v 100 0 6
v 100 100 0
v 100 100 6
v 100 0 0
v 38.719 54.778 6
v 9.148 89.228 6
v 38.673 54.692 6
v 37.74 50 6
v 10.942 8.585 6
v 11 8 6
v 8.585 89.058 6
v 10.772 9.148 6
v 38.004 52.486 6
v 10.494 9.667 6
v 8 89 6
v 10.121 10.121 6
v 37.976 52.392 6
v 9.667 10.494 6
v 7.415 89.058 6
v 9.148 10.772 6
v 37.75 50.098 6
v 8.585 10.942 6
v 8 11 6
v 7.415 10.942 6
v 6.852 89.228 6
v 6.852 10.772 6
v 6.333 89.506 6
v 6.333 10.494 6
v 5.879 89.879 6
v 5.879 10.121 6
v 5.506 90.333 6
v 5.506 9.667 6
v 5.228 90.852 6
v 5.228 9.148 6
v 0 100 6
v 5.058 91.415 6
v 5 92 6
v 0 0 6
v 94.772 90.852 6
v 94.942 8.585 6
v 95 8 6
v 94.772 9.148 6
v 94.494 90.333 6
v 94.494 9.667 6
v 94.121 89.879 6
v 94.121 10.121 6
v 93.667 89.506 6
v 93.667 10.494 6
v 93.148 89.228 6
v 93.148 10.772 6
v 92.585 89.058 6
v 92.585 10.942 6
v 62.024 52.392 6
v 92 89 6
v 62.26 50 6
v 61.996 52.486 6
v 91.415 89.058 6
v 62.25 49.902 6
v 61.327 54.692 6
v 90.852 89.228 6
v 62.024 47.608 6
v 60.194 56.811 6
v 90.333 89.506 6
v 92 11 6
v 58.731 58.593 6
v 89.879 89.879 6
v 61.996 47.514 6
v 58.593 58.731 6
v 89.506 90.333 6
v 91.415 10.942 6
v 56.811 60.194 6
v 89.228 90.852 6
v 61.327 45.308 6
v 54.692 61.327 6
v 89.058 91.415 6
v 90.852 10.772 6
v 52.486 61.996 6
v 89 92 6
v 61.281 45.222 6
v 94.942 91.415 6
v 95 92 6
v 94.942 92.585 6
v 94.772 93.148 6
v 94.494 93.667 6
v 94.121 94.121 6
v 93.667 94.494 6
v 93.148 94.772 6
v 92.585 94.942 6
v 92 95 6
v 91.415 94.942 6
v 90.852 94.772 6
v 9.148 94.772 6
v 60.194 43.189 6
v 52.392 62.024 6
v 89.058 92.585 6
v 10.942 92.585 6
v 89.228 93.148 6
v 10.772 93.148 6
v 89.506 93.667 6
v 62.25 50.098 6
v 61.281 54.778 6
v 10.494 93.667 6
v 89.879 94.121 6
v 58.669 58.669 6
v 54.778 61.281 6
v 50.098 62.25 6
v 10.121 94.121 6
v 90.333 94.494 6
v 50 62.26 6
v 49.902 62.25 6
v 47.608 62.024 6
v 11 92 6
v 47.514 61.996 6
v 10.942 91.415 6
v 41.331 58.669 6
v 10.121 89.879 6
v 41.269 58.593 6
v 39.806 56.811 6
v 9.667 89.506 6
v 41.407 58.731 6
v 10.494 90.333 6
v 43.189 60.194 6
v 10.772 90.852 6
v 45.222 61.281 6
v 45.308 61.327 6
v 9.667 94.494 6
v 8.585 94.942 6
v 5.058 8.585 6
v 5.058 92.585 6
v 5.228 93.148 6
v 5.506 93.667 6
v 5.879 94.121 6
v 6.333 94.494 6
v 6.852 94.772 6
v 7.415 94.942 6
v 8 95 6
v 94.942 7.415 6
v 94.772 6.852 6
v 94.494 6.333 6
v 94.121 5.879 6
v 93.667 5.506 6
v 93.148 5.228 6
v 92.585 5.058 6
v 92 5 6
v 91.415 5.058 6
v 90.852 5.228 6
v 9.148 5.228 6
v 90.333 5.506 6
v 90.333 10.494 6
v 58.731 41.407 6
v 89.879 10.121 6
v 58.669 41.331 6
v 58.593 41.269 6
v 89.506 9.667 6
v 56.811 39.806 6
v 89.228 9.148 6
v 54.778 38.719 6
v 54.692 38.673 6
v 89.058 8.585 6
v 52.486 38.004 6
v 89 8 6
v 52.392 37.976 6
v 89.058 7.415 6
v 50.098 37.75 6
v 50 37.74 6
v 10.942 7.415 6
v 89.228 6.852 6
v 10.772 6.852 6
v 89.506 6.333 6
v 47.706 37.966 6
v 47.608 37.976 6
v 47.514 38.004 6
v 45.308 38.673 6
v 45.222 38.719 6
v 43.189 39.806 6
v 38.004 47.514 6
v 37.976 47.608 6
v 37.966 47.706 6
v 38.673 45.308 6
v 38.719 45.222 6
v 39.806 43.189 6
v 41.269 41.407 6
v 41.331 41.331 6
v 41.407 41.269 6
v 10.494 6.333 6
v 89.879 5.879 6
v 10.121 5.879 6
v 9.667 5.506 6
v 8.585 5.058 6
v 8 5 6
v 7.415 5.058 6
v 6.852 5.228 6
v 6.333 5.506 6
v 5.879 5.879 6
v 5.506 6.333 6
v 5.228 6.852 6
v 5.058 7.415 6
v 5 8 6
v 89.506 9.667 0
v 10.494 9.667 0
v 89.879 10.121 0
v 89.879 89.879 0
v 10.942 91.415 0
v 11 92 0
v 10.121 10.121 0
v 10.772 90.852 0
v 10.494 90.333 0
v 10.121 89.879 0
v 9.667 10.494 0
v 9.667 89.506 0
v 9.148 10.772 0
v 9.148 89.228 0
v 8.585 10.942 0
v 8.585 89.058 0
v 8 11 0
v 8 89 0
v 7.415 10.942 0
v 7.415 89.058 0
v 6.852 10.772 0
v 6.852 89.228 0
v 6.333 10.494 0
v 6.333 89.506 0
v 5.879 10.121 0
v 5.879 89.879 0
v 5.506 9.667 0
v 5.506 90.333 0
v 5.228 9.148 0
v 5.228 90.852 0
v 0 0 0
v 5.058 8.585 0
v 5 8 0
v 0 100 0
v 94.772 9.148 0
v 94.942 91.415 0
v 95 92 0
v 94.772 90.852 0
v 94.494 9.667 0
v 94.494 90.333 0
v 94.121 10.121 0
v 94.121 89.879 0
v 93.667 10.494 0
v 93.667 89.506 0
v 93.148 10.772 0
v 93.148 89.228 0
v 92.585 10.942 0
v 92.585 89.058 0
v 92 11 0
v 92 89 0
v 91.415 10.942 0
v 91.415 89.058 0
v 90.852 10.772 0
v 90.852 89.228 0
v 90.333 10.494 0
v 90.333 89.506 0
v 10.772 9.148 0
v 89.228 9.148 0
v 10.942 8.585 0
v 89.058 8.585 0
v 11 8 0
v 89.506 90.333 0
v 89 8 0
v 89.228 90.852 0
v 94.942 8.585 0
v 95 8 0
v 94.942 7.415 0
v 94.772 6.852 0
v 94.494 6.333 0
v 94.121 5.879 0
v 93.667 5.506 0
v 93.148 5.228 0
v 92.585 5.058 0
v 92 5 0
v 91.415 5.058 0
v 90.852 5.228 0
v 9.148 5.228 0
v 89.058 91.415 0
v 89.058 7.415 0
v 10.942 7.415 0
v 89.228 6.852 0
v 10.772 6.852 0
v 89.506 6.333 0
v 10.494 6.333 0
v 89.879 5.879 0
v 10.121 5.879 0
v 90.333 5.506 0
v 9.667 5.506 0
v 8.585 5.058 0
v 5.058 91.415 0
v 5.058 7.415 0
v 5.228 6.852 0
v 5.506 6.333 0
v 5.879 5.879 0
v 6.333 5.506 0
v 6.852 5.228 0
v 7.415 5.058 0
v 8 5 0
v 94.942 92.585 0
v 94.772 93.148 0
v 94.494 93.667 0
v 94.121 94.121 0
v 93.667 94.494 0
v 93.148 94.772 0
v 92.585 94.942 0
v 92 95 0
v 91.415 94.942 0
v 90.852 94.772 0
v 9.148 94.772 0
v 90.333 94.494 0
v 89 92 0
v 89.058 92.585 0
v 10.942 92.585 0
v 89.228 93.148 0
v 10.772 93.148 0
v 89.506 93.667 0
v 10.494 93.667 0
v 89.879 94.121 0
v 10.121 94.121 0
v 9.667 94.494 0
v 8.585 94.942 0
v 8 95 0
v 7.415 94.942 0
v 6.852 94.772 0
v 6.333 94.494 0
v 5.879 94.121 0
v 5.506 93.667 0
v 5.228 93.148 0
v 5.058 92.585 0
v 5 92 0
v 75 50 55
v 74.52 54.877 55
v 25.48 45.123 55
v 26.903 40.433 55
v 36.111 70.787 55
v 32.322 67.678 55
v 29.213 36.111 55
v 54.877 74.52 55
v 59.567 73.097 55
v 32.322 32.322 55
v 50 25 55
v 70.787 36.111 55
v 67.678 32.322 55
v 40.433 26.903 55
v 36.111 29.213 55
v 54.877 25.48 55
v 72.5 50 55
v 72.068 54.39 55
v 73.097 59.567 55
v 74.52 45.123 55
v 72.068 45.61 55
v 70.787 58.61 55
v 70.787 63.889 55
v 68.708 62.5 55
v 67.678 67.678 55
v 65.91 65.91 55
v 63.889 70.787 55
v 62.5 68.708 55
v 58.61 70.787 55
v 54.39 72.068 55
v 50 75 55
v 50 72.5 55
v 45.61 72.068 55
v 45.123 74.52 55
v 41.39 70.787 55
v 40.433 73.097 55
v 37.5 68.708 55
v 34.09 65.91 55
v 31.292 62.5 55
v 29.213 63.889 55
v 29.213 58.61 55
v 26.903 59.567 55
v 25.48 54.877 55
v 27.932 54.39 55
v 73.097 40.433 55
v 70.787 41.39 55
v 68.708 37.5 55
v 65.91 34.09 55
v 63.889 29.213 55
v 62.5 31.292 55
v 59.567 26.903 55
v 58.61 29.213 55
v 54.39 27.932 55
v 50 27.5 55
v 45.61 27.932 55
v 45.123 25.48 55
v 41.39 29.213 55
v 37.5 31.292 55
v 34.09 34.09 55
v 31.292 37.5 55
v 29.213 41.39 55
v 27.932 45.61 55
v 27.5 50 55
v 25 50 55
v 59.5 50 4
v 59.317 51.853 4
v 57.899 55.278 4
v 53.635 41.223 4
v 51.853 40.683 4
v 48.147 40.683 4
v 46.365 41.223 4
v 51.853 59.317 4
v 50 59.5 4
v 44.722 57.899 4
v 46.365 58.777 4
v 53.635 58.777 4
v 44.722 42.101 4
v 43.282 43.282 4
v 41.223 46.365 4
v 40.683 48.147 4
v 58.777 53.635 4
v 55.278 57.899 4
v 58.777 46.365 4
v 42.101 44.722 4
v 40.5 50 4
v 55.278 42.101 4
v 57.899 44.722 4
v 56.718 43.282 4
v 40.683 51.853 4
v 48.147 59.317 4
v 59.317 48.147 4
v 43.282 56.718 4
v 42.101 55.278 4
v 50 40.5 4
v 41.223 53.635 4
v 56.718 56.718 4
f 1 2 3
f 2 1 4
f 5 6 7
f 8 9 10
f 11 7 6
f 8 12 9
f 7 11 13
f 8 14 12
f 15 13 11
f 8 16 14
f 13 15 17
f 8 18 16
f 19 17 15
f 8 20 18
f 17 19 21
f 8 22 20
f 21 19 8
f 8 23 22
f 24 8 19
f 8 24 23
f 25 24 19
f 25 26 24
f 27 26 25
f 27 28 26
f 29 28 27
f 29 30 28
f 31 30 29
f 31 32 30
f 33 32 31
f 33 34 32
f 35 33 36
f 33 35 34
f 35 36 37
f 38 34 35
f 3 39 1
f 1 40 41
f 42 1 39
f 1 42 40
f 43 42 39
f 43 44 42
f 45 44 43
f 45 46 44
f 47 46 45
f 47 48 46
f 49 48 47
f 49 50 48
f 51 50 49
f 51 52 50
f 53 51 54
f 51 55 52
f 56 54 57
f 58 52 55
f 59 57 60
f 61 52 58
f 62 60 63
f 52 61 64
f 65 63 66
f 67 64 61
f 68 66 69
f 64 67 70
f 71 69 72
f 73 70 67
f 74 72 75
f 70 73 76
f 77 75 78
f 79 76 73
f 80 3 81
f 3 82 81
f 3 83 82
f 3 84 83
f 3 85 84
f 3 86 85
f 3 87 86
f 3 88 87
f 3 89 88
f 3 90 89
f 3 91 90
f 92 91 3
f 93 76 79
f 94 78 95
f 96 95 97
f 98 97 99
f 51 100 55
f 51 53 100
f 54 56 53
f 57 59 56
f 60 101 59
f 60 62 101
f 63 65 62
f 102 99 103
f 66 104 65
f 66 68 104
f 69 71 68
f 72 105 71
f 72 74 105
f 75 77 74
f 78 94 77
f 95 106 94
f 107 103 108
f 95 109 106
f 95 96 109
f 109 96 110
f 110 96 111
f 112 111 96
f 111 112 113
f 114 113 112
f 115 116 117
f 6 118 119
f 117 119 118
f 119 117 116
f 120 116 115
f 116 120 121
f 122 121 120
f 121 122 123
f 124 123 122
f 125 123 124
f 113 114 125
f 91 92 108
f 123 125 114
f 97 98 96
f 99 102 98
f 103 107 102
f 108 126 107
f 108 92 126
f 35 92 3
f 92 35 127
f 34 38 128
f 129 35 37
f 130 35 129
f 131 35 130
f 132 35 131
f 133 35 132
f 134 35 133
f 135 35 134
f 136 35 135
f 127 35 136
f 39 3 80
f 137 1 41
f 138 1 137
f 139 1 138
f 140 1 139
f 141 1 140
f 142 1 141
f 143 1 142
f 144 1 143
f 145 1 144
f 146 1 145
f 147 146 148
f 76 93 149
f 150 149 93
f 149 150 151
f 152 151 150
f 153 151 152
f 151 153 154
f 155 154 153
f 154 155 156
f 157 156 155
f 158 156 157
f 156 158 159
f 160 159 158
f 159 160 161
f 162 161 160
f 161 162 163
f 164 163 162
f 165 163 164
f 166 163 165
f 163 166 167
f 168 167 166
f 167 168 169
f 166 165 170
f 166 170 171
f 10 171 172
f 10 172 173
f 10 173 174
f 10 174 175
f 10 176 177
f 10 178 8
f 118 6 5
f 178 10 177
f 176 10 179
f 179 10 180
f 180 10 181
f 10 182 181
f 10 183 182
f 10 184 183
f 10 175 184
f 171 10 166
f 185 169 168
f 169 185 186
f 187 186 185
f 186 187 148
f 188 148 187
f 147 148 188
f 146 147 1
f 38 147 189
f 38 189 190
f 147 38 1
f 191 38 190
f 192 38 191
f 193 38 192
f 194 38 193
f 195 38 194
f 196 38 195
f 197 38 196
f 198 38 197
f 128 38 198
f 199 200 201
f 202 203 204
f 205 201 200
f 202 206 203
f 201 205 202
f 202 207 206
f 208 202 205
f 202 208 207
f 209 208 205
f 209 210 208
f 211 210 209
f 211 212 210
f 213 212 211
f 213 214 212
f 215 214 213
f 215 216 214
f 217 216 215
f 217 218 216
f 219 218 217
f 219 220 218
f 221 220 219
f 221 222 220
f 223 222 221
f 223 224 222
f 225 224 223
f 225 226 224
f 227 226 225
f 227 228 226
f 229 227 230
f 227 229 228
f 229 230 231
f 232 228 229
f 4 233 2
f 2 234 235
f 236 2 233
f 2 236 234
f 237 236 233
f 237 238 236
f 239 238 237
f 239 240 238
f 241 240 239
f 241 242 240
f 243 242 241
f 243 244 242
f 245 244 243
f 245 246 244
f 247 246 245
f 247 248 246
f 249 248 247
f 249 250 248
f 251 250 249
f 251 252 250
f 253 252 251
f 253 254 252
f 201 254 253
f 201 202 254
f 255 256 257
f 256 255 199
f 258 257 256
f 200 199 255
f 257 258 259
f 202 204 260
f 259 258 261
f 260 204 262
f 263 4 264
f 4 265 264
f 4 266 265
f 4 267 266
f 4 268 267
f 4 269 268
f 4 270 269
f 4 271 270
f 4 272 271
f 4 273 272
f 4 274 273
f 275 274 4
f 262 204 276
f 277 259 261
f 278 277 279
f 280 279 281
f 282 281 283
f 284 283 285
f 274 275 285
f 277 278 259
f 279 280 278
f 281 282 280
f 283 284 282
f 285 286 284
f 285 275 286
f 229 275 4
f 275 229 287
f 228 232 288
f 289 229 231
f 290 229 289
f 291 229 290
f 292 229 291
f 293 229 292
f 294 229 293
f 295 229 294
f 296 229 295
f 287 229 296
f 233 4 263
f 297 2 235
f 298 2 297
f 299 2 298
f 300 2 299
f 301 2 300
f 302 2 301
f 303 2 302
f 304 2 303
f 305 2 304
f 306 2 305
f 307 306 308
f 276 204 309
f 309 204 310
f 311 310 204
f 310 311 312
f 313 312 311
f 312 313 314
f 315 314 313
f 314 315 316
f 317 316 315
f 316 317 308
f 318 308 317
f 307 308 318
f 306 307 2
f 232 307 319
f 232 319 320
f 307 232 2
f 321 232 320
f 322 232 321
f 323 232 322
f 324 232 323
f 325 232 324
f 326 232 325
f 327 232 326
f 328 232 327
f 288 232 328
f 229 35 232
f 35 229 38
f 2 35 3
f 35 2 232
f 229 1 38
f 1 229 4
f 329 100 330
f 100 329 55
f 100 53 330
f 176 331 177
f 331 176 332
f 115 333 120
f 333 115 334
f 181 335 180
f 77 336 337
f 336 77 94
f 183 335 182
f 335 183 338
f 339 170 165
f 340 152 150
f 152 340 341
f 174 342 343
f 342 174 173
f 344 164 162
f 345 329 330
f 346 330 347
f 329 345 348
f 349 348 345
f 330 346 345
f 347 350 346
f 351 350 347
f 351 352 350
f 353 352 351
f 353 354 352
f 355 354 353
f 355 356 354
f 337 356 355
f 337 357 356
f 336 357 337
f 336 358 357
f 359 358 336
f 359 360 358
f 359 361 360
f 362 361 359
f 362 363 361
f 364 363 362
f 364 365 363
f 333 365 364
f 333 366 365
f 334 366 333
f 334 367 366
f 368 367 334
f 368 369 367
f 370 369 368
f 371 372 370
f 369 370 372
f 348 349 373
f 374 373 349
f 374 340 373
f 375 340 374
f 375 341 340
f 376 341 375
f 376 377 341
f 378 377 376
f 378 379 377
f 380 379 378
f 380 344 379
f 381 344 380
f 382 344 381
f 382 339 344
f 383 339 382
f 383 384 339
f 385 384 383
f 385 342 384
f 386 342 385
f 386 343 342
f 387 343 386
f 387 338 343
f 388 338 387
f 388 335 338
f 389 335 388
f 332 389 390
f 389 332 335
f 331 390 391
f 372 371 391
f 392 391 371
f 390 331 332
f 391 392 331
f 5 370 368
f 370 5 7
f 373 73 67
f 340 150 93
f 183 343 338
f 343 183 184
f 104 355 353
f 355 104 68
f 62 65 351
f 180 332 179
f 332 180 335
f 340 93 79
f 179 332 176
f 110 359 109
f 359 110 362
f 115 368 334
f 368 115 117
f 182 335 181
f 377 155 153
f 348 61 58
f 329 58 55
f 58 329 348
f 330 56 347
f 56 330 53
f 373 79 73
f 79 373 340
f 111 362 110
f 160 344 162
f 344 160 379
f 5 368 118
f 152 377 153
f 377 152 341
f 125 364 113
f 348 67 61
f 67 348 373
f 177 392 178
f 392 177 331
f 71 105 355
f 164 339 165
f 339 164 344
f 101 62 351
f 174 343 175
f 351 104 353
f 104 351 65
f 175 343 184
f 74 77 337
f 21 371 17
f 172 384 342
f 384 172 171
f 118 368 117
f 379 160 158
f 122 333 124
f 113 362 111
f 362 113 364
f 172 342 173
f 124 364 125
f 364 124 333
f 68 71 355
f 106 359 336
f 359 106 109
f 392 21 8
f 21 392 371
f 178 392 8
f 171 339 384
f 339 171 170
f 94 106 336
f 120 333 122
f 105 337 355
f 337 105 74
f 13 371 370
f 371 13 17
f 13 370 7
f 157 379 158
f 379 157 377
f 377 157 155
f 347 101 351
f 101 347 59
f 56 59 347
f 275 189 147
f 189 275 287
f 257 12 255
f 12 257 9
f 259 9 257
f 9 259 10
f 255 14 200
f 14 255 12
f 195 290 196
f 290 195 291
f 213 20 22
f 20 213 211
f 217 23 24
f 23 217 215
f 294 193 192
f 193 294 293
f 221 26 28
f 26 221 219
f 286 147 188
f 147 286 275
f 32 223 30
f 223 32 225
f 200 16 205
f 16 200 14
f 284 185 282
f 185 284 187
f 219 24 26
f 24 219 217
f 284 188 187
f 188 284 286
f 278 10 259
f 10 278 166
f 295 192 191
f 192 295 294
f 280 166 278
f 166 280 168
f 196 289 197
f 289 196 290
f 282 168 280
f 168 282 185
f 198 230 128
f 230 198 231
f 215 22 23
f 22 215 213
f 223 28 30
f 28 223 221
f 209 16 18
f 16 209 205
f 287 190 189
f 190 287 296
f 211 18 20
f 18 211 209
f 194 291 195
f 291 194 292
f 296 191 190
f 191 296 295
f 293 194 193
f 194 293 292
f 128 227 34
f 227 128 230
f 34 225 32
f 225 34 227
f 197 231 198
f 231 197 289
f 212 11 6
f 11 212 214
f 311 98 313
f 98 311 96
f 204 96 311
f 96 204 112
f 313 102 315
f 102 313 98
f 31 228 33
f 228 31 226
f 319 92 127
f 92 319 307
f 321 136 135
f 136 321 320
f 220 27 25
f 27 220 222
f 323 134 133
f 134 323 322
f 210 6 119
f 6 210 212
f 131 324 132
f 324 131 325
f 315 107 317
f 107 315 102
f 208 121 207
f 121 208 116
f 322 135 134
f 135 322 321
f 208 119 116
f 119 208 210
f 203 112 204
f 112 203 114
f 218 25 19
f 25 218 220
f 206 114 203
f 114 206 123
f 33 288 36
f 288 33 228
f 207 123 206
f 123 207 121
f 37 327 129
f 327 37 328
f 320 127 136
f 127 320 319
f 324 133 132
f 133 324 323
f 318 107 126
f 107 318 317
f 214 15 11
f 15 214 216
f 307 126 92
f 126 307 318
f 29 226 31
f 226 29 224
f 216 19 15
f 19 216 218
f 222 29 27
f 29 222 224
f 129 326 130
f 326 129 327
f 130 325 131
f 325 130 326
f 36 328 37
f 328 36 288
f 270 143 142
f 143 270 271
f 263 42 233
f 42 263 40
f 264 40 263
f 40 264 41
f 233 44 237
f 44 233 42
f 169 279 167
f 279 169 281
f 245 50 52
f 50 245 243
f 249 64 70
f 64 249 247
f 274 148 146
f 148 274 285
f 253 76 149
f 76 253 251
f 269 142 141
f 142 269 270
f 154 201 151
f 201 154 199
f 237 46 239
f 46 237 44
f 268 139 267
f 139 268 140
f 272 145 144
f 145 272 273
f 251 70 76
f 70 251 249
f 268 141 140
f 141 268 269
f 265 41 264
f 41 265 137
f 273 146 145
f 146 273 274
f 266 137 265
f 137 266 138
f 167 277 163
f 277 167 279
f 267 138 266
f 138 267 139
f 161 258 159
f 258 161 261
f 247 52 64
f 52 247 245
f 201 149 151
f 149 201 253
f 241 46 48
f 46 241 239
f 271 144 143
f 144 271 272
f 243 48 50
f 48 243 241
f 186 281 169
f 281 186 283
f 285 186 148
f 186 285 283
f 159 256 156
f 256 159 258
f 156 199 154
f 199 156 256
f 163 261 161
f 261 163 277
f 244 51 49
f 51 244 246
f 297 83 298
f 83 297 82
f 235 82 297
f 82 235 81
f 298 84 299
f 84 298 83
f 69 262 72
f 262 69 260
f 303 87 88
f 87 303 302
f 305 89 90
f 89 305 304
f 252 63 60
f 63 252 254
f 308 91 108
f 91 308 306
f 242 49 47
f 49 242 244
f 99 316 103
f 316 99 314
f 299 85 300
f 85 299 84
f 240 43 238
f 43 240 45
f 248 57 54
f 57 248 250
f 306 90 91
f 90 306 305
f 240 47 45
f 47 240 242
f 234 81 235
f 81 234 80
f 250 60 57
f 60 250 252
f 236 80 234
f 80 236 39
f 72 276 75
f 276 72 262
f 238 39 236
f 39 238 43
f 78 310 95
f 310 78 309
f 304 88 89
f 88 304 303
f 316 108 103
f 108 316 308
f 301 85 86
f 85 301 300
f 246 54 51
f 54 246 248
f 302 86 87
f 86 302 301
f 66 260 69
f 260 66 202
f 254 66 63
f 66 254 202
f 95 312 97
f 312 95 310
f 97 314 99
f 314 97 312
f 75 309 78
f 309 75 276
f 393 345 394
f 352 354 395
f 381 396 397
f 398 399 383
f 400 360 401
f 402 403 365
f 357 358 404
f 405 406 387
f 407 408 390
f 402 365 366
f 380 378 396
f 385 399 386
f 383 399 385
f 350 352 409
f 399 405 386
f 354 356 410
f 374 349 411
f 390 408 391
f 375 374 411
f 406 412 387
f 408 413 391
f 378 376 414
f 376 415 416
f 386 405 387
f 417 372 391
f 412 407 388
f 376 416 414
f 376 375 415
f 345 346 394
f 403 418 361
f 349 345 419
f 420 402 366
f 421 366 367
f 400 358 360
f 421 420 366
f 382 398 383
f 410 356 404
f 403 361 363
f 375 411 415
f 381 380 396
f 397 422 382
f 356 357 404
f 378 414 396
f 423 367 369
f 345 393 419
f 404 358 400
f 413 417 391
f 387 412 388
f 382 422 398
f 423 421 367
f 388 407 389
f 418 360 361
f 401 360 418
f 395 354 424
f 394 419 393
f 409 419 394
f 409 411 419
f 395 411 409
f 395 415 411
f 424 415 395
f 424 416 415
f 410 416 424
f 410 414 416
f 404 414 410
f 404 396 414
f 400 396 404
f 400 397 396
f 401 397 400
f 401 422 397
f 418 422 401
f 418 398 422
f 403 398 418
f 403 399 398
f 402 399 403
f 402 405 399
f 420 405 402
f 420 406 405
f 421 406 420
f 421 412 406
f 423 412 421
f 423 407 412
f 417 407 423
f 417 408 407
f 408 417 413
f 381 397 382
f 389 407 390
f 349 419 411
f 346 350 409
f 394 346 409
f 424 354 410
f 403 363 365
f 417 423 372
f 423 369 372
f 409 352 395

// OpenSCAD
$fn = 32;

// ----------------------------------------------------------------------
// Hopper: flanged with square flange
// ----------------------------------------------------------------------

// --- parameters (mm) ---
fl = 100;                 // flange side, X and Y
fl_t = 6;                 // flange thickness
cone_h = 50;              // cone height above the flange
top_d = 50;               // cone mouth diameter
bot_d = 24;               // cone spout diameter
wall = 2.5;               // cone wall thickness
hole_r = 3;               // flange hole radius
hole_in = 8;              // hole inset from the corners
fit_tol = 0.1;            // tolerance for press fits, mm
free_tol = 0.3;           // tolerance for clearance fits, mm

bore_d = bot_d - 2 * wall;  // spout bore diameter
total_h = fl_t + cone_h - 1;  // overall height

difference() {
  union() {
    cube([fl, fl, fl_t]);
    translate([fl / 2, fl / 2, fl_t - 1])
      cylinder(h = cone_h, d1 = bot_d, d2 = top_d);
  }
  translate([fl / 2, fl / 2, fl_t - 2])
    cylinder(h = cone_h + 1, d1 = bore_d, d2 = top_d - 2 * wall);
  for (sx = [0, 1], sy = [0, 1])
    translate([sx ? fl - hole_in : hole_in,
               sy ? fl - hole_in : hole_in, -1])
      cylinder(r = hole_r, h = fl_t + 2);
}
